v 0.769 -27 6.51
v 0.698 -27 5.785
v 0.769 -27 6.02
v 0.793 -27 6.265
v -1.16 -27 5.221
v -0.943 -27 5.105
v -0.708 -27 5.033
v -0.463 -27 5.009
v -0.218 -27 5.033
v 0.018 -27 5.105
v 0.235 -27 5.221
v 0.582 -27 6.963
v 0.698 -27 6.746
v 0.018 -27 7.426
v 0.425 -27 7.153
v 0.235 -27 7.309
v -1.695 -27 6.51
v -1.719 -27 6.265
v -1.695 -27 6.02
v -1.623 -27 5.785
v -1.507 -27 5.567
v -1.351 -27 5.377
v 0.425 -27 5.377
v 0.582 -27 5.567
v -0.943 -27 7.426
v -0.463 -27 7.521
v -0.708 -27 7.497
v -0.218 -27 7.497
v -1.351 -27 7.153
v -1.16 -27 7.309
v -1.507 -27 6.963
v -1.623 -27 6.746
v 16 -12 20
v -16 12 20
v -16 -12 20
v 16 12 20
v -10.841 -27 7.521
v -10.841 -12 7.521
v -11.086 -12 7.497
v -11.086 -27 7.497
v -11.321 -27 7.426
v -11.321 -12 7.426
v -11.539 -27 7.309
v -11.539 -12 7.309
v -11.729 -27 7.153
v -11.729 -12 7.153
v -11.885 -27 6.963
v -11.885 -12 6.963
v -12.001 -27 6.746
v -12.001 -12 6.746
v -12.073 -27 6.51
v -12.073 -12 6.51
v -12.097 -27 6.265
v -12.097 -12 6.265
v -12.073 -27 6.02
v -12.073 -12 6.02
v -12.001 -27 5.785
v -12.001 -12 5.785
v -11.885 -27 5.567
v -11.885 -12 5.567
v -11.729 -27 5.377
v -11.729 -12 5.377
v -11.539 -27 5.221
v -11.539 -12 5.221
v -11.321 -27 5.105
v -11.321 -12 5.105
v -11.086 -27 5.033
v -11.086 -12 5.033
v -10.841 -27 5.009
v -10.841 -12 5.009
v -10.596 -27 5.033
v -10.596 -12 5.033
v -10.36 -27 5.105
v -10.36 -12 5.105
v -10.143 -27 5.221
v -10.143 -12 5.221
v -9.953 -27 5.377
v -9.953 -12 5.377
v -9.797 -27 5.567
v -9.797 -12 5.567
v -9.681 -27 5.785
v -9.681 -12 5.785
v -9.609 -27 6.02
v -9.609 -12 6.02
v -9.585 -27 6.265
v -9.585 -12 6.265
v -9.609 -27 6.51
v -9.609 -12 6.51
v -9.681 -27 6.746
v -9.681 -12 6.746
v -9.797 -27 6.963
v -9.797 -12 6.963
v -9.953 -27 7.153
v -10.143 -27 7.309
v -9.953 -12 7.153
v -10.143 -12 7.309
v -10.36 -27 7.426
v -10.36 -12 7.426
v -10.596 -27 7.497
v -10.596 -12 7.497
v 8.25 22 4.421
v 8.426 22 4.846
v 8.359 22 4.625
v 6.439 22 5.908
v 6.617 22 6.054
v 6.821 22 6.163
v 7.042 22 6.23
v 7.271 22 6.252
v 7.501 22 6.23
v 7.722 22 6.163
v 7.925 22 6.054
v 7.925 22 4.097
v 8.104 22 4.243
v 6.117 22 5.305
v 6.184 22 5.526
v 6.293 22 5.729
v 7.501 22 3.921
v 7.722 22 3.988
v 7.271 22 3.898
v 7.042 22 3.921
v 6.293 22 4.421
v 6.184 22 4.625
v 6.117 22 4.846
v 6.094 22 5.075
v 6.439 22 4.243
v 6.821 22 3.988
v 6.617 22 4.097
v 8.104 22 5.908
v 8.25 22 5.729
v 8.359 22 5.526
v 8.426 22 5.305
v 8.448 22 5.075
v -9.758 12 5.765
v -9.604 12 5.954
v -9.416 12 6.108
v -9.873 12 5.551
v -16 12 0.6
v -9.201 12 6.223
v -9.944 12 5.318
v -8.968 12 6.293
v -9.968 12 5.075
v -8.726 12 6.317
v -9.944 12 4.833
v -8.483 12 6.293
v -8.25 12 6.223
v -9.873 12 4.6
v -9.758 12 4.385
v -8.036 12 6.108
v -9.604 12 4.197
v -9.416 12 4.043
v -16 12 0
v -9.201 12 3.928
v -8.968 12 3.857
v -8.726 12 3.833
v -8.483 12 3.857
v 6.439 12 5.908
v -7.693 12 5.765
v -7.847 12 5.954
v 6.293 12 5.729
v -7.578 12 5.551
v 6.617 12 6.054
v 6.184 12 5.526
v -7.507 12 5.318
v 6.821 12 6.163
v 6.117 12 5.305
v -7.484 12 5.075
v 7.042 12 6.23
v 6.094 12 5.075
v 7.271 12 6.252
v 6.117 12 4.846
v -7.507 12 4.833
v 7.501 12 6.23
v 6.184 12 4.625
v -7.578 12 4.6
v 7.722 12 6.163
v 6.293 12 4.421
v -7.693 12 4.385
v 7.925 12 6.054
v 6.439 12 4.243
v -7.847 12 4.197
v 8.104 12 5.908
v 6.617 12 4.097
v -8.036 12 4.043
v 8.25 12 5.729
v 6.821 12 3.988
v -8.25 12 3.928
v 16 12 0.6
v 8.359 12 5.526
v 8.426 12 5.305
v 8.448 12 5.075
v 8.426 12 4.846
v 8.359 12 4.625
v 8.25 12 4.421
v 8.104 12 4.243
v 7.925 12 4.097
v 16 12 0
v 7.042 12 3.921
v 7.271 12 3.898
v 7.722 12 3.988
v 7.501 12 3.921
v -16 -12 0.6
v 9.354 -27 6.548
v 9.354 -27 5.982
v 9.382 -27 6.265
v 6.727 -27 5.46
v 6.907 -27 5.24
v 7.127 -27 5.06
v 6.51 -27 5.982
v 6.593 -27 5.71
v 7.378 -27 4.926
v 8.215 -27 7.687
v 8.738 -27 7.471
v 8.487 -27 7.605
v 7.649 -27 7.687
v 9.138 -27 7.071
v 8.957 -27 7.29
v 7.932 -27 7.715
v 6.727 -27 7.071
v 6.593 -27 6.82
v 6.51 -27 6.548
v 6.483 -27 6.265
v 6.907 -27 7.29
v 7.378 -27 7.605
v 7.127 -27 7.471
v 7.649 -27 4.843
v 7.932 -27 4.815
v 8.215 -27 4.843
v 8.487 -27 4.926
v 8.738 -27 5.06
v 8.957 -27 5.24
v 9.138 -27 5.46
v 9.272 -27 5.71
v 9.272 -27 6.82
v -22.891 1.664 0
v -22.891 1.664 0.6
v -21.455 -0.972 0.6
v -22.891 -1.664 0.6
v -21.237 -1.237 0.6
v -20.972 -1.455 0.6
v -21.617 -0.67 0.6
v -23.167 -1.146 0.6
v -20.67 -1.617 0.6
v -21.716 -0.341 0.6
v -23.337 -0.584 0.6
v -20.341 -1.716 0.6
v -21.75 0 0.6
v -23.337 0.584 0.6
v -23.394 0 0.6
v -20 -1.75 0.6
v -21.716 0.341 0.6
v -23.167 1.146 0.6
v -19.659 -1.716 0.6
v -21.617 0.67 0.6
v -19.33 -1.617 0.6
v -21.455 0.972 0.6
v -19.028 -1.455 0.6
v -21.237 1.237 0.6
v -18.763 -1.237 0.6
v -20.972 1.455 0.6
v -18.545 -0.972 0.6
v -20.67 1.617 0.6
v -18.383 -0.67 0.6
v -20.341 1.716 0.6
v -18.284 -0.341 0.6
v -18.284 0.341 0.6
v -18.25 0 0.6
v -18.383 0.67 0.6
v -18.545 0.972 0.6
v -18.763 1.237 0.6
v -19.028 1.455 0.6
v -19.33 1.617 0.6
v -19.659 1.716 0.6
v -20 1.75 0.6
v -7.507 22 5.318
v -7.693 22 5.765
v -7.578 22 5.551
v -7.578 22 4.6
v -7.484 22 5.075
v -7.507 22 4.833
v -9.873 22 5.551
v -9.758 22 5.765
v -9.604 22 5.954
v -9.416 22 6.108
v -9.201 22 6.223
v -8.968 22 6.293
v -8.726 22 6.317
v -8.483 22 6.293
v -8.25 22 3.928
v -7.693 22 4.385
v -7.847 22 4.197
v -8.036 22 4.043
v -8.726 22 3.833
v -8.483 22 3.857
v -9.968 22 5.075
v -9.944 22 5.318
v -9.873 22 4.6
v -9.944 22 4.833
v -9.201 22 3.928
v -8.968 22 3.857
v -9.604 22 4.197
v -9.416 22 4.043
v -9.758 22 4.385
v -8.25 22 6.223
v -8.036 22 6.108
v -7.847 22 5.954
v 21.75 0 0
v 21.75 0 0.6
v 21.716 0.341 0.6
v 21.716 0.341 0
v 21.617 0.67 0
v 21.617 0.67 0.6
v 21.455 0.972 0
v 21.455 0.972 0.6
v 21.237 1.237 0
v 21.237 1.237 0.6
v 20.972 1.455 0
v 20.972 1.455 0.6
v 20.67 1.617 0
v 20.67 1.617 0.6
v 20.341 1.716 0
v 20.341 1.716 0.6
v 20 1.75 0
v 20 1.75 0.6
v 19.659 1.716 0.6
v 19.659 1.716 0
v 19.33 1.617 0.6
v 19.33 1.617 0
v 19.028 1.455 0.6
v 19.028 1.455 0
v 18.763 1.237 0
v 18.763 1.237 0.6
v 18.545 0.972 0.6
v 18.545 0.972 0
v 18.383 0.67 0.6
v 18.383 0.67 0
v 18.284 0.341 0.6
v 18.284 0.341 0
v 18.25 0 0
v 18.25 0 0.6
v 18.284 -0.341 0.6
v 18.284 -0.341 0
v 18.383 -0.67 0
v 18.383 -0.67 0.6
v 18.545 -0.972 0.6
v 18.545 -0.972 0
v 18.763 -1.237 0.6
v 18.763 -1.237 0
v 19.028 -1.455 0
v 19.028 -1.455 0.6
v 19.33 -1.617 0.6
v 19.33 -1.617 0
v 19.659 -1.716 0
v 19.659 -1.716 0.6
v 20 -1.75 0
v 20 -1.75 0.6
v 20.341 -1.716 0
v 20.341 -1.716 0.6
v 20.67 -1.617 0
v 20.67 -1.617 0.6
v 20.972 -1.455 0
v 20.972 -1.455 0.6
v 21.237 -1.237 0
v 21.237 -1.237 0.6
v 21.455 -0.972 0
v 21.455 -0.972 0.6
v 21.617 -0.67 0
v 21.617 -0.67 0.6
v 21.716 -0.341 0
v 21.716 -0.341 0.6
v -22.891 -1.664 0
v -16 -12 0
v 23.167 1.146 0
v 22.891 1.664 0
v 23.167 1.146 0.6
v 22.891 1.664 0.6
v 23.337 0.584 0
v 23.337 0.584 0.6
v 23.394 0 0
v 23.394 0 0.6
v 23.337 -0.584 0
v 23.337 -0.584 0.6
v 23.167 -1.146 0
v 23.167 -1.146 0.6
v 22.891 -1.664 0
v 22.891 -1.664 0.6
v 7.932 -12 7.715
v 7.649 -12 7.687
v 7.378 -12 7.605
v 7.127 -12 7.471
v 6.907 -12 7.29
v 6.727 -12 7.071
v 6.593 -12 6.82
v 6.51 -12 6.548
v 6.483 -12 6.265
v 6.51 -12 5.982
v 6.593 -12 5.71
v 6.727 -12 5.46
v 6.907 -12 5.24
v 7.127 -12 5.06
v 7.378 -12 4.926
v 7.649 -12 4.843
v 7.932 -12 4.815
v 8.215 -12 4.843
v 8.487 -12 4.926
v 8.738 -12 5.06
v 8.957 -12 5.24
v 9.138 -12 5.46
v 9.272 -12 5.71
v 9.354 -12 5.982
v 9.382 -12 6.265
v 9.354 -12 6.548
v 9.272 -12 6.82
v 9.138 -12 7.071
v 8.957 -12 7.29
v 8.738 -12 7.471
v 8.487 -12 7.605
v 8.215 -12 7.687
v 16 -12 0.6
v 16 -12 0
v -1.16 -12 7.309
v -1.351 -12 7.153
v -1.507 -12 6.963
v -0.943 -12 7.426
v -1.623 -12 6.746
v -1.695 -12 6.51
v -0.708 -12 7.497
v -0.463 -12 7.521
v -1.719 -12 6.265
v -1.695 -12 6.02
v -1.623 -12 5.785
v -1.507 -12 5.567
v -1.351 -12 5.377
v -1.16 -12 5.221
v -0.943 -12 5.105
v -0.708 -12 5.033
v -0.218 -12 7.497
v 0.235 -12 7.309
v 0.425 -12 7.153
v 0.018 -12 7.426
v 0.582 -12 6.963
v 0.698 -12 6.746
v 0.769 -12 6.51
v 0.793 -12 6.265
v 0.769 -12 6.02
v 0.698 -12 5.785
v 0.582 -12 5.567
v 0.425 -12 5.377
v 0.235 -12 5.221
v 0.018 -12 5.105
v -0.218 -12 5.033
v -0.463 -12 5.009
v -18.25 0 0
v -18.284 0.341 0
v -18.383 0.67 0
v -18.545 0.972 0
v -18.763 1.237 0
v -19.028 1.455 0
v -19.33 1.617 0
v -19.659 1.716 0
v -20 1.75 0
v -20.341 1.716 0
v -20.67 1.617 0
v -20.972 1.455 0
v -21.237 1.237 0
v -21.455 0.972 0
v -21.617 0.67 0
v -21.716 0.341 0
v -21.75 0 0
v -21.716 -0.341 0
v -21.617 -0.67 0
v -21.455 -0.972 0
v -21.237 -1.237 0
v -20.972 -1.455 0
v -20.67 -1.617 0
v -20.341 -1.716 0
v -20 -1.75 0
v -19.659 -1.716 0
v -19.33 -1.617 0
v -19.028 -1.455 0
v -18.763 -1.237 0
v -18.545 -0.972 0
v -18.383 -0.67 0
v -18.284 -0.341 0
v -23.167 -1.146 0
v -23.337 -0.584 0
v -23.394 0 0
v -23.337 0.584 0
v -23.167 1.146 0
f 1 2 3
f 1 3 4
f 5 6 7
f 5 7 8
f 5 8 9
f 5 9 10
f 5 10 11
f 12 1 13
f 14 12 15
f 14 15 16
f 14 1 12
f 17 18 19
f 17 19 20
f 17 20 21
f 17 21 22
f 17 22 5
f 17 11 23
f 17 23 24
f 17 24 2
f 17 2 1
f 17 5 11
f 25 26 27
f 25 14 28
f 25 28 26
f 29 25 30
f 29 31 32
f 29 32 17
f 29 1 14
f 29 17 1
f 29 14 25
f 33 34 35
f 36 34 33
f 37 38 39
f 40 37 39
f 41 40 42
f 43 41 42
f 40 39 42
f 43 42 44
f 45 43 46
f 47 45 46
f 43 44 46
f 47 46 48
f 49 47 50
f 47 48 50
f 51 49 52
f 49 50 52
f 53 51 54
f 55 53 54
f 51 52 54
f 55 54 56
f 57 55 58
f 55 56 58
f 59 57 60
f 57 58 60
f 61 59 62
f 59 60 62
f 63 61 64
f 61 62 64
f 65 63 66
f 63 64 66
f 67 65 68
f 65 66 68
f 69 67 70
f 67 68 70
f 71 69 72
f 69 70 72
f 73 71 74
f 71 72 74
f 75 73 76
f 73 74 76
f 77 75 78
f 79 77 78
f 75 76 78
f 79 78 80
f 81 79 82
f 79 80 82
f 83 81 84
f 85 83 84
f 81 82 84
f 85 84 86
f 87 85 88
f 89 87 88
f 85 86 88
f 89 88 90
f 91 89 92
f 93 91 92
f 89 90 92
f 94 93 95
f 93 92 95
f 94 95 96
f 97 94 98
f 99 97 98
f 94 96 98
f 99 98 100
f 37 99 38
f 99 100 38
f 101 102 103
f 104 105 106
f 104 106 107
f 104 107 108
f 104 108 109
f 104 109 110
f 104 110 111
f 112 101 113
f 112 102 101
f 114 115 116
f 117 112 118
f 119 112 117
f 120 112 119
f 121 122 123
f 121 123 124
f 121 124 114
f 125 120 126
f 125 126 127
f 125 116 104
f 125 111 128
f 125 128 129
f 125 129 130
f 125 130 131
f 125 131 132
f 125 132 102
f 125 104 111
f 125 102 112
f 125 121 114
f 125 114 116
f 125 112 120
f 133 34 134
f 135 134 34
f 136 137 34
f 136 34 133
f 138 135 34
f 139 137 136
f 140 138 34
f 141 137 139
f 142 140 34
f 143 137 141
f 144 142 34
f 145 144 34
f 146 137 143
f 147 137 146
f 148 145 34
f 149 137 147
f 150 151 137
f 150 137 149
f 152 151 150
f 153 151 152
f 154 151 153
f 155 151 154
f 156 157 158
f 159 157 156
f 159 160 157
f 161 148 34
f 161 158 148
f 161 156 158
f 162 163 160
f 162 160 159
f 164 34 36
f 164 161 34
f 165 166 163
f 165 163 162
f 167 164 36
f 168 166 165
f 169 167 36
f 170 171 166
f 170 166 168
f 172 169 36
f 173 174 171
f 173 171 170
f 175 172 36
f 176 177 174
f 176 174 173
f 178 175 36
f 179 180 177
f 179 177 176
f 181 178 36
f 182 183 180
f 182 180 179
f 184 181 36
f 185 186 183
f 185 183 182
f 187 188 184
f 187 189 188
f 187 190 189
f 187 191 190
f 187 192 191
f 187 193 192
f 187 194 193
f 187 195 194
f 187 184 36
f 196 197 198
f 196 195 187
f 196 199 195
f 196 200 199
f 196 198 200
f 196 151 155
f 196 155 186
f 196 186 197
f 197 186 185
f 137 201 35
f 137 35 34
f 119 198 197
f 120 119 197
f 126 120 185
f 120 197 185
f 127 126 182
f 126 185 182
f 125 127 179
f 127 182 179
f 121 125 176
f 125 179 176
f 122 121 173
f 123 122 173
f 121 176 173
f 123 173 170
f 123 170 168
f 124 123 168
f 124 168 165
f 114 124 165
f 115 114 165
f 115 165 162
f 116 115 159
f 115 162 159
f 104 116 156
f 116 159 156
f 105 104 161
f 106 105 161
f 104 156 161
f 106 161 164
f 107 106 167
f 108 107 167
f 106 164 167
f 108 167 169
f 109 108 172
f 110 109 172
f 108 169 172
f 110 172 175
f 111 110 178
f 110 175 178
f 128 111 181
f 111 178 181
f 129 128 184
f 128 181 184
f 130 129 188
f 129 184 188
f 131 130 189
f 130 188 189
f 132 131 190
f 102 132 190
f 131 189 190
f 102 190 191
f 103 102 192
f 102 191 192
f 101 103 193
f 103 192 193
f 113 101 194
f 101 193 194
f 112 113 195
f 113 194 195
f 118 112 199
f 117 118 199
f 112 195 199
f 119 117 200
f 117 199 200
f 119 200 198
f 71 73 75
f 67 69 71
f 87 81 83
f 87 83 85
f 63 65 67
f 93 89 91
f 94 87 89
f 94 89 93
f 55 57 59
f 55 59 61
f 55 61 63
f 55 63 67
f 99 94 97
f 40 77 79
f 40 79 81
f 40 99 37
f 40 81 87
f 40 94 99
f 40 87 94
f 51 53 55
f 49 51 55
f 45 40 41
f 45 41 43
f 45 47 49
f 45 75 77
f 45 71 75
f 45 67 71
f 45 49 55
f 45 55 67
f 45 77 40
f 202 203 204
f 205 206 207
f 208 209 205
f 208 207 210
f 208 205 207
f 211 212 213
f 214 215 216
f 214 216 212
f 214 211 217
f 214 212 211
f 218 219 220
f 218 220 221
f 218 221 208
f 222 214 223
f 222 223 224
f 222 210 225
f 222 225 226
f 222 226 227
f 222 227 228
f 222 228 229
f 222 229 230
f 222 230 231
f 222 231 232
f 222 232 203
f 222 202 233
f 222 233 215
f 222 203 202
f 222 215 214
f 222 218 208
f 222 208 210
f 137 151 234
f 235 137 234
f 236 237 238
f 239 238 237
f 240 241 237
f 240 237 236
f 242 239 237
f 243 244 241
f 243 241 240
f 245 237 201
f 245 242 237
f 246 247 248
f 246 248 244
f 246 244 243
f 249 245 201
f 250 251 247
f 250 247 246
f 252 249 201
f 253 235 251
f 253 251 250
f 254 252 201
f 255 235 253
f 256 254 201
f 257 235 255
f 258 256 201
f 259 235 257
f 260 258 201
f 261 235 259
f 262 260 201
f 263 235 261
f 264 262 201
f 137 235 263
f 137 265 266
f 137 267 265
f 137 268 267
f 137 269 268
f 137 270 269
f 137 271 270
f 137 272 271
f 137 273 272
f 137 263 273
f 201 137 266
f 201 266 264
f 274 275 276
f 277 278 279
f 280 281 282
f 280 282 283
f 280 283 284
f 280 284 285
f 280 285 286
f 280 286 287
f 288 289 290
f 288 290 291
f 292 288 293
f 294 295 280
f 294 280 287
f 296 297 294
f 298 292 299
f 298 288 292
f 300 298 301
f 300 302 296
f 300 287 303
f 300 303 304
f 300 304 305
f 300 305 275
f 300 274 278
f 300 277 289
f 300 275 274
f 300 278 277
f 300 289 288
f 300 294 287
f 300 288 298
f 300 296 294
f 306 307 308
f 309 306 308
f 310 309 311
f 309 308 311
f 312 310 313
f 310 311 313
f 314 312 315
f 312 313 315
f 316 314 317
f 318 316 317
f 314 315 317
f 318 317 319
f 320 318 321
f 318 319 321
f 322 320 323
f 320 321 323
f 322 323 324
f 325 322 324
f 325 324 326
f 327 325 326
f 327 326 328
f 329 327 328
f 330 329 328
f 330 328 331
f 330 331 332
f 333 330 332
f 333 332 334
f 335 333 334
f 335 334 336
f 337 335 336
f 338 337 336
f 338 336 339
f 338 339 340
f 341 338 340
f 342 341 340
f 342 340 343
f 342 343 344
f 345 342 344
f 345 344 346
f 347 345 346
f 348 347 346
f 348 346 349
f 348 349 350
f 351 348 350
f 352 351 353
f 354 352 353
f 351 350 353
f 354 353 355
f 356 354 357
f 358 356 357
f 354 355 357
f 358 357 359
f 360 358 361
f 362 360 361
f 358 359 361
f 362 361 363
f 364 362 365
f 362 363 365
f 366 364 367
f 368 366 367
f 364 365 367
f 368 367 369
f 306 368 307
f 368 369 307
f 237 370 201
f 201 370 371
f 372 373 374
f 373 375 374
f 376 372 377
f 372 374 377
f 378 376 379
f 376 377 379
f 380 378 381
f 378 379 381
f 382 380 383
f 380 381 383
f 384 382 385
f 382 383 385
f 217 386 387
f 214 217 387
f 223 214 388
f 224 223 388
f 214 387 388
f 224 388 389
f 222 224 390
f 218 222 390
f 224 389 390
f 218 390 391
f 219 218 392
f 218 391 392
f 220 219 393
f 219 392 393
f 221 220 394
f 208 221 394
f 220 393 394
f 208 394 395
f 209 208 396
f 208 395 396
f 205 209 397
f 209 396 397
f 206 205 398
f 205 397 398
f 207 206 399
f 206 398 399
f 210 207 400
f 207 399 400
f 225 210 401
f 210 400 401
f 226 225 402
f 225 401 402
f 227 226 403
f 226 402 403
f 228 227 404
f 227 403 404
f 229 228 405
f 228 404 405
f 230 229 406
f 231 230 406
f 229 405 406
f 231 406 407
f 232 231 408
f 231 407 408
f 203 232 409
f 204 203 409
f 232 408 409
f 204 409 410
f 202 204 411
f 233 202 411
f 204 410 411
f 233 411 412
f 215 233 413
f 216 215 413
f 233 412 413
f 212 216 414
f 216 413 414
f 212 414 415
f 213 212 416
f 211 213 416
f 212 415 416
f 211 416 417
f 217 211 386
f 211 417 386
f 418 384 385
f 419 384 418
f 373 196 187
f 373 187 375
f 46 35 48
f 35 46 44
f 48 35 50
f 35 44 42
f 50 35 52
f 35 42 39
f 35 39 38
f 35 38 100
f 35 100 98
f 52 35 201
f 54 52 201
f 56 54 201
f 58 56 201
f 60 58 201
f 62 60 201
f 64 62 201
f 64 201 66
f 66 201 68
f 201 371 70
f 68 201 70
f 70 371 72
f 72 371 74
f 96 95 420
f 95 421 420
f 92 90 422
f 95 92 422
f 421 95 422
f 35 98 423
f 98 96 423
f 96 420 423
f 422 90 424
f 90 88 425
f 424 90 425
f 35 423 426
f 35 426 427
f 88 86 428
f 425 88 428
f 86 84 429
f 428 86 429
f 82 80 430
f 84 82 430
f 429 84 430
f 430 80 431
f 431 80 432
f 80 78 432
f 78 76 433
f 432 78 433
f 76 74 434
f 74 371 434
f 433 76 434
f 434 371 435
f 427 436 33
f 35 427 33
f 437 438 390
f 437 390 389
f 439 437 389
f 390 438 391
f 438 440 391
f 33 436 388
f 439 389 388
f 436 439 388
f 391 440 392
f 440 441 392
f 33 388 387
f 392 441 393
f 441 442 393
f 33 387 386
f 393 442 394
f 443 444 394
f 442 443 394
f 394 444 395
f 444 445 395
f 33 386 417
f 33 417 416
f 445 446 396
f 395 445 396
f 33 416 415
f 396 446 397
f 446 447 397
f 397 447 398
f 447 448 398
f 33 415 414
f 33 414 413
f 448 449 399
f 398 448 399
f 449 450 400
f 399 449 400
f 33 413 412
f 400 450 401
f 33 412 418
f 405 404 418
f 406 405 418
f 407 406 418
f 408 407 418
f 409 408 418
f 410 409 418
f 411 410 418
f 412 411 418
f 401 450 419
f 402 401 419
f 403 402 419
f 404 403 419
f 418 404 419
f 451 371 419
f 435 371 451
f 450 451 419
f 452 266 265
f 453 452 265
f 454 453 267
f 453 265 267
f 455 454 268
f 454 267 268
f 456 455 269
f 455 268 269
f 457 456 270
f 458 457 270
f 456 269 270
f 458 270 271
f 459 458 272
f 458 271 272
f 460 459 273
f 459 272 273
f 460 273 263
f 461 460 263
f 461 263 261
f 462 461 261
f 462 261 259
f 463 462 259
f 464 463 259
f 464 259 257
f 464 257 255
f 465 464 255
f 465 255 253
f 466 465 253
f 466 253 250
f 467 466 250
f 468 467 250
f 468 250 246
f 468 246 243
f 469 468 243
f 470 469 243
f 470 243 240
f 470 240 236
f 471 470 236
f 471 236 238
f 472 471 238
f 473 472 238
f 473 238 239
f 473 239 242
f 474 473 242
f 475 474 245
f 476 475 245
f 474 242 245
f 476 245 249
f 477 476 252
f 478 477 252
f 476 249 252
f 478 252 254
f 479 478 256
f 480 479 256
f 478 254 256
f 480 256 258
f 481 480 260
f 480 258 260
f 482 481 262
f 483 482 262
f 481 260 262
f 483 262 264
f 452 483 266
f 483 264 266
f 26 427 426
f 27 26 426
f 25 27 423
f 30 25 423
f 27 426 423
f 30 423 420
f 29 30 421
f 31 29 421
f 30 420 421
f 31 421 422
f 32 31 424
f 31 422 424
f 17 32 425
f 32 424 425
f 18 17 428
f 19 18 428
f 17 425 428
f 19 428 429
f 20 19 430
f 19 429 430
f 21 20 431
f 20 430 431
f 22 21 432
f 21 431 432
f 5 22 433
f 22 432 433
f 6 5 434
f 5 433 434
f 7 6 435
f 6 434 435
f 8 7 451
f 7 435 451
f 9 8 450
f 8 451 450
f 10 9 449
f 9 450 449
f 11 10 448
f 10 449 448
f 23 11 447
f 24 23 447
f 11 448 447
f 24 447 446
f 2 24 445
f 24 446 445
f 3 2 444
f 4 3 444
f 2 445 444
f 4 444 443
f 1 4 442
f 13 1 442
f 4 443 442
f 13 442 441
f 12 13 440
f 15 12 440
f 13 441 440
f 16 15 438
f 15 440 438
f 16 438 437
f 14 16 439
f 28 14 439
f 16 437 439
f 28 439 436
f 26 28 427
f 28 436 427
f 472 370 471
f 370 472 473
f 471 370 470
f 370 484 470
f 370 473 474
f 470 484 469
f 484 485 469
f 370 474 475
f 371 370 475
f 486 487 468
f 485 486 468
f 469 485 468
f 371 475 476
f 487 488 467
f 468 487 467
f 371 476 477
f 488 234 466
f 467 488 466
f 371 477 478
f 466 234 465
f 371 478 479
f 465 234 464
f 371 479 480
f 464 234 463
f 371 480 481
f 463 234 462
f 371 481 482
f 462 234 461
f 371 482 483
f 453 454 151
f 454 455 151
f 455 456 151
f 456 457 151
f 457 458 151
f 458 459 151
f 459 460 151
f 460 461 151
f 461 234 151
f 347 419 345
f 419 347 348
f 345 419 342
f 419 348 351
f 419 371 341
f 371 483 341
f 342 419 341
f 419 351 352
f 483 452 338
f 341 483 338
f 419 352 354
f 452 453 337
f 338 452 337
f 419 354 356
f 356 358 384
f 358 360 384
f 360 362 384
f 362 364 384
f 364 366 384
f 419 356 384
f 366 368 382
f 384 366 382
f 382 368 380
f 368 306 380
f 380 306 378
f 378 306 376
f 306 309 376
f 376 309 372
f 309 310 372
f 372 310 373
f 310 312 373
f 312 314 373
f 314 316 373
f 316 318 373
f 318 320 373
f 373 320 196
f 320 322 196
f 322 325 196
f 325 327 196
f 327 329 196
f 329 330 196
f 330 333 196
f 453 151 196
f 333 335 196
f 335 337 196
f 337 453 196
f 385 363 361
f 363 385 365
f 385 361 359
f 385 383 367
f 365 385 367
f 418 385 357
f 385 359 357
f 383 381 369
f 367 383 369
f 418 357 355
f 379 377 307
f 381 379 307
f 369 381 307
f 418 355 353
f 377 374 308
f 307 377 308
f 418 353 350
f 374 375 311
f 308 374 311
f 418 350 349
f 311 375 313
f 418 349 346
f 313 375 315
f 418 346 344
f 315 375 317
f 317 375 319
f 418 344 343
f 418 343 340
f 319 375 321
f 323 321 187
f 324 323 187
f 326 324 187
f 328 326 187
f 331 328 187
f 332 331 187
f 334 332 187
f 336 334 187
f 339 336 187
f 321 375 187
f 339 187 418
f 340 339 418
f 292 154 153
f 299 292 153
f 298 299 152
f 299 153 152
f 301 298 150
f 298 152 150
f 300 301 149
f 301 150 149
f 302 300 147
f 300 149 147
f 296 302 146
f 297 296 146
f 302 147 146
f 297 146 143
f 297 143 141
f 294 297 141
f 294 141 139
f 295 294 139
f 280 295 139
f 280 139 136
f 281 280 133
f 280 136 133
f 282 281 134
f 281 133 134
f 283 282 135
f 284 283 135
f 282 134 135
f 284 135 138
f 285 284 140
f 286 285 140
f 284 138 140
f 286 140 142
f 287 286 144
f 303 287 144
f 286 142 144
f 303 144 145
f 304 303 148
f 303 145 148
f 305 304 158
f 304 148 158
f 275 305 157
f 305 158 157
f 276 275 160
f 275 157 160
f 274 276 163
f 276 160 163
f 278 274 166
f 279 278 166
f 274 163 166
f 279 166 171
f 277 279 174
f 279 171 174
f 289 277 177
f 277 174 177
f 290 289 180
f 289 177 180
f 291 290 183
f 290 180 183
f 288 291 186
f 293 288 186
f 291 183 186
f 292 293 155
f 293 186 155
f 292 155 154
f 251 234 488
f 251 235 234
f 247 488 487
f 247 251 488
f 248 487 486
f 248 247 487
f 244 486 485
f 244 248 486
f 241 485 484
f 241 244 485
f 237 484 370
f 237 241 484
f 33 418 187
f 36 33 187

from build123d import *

# Parameters (mm, degrees)
SKETCH_1_W          = 32
SKETCH_1_H          = 24
EXTRUDE_1_DEPTH     = 20
EXTRUDE_2_DEPTH     = 0.6
SKETCH_3_R          = 1.75
CUT_EXTRUDE_1_DEPTH = 34.111327367
FILLET_1_R          = 3
SKETCH_4_R          = 1.241957667
SKETCH_4_R_2        = 1.176925768
EXTRUDE_3_DEPTH     = 10
SKETCH_5_R          = 1.255951998
SKETCH_5_R_2        = 1.449746198
EXTRUDE_4_DEPTH     = 15


with BuildPart() as part:
    # 草图1 → 凸台-拉伸1 (new body)
    with BuildSketch(Plane.XY):
        Rectangle(SKETCH_1_W, SKETCH_1_H)
    extrude(amount=EXTRUDE_1_DEPTH)

    # 草图2 → 凸台-拉伸2 (add)
    with BuildSketch(Plane.XY):
        Polygon((-16, 12), (-24, 0), (-16, -12), align=None)
        Polygon((16, -12), (16, 12), (24, 0), align=None)
    extrude(amount=EXTRUDE_2_DEPTH)

    # 草图3 → 切除-拉伸1 (cut, through all)
    with BuildSketch(Plane.XY.offset(0.6)):
        with Locations((-20, 0)):
            Circle(SKETCH_3_R)
        with Locations((20, 0)):
            Circle(SKETCH_3_R)
    extrude(amount=-CUT_EXTRUDE_1_DEPTH, mode=Mode.SUBTRACT)

    # 圆角1
    fillet_1_edges = [part.edges().sort_by_distance(p)[0] for p in [
        (24, 0, 0.3),
        (-24, 0, 0.3),
    ]]
    fillet(fillet_1_edges, radius=FILLET_1_R)

    # 草图4 → 凸台-拉伸3 (add)
    with BuildSketch(Plane(origin=(0, 12, 0), x_dir=(1, 0, 0), z_dir=(0, 1, 0))):
        with Locations(Location((-8.72556125, -5.075346112, 0), (0, 0, 90))):
            Circle(SKETCH_4_R)
        with Locations(Location((7.271301042, -5.075346112, 0), (0, 0, 90))):
            Circle(SKETCH_4_R_2)
    extrude(amount=EXTRUDE_3_DEPTH)

    # 草图5 → 凸台-拉伸4 (add)
    with BuildSketch(Plane.XZ.offset(12)):
        with Locations(Location((-10.840848826, 6.265195374, 0), (0, 0, 90))):
            Circle(SKETCH_5_R)
        with Locations(Location((-0.462719157, 6.265195374, 0), (0, 0, 90))):
            Circle(SKETCH_5_R)
        with Locations(Location((7.932328409, 6.265195374, 0), (0, 0, 90))):
            Circle(SKETCH_5_R_2)
    extrude(amount=EXTRUDE_4_DEPTH)


solid = part.part
